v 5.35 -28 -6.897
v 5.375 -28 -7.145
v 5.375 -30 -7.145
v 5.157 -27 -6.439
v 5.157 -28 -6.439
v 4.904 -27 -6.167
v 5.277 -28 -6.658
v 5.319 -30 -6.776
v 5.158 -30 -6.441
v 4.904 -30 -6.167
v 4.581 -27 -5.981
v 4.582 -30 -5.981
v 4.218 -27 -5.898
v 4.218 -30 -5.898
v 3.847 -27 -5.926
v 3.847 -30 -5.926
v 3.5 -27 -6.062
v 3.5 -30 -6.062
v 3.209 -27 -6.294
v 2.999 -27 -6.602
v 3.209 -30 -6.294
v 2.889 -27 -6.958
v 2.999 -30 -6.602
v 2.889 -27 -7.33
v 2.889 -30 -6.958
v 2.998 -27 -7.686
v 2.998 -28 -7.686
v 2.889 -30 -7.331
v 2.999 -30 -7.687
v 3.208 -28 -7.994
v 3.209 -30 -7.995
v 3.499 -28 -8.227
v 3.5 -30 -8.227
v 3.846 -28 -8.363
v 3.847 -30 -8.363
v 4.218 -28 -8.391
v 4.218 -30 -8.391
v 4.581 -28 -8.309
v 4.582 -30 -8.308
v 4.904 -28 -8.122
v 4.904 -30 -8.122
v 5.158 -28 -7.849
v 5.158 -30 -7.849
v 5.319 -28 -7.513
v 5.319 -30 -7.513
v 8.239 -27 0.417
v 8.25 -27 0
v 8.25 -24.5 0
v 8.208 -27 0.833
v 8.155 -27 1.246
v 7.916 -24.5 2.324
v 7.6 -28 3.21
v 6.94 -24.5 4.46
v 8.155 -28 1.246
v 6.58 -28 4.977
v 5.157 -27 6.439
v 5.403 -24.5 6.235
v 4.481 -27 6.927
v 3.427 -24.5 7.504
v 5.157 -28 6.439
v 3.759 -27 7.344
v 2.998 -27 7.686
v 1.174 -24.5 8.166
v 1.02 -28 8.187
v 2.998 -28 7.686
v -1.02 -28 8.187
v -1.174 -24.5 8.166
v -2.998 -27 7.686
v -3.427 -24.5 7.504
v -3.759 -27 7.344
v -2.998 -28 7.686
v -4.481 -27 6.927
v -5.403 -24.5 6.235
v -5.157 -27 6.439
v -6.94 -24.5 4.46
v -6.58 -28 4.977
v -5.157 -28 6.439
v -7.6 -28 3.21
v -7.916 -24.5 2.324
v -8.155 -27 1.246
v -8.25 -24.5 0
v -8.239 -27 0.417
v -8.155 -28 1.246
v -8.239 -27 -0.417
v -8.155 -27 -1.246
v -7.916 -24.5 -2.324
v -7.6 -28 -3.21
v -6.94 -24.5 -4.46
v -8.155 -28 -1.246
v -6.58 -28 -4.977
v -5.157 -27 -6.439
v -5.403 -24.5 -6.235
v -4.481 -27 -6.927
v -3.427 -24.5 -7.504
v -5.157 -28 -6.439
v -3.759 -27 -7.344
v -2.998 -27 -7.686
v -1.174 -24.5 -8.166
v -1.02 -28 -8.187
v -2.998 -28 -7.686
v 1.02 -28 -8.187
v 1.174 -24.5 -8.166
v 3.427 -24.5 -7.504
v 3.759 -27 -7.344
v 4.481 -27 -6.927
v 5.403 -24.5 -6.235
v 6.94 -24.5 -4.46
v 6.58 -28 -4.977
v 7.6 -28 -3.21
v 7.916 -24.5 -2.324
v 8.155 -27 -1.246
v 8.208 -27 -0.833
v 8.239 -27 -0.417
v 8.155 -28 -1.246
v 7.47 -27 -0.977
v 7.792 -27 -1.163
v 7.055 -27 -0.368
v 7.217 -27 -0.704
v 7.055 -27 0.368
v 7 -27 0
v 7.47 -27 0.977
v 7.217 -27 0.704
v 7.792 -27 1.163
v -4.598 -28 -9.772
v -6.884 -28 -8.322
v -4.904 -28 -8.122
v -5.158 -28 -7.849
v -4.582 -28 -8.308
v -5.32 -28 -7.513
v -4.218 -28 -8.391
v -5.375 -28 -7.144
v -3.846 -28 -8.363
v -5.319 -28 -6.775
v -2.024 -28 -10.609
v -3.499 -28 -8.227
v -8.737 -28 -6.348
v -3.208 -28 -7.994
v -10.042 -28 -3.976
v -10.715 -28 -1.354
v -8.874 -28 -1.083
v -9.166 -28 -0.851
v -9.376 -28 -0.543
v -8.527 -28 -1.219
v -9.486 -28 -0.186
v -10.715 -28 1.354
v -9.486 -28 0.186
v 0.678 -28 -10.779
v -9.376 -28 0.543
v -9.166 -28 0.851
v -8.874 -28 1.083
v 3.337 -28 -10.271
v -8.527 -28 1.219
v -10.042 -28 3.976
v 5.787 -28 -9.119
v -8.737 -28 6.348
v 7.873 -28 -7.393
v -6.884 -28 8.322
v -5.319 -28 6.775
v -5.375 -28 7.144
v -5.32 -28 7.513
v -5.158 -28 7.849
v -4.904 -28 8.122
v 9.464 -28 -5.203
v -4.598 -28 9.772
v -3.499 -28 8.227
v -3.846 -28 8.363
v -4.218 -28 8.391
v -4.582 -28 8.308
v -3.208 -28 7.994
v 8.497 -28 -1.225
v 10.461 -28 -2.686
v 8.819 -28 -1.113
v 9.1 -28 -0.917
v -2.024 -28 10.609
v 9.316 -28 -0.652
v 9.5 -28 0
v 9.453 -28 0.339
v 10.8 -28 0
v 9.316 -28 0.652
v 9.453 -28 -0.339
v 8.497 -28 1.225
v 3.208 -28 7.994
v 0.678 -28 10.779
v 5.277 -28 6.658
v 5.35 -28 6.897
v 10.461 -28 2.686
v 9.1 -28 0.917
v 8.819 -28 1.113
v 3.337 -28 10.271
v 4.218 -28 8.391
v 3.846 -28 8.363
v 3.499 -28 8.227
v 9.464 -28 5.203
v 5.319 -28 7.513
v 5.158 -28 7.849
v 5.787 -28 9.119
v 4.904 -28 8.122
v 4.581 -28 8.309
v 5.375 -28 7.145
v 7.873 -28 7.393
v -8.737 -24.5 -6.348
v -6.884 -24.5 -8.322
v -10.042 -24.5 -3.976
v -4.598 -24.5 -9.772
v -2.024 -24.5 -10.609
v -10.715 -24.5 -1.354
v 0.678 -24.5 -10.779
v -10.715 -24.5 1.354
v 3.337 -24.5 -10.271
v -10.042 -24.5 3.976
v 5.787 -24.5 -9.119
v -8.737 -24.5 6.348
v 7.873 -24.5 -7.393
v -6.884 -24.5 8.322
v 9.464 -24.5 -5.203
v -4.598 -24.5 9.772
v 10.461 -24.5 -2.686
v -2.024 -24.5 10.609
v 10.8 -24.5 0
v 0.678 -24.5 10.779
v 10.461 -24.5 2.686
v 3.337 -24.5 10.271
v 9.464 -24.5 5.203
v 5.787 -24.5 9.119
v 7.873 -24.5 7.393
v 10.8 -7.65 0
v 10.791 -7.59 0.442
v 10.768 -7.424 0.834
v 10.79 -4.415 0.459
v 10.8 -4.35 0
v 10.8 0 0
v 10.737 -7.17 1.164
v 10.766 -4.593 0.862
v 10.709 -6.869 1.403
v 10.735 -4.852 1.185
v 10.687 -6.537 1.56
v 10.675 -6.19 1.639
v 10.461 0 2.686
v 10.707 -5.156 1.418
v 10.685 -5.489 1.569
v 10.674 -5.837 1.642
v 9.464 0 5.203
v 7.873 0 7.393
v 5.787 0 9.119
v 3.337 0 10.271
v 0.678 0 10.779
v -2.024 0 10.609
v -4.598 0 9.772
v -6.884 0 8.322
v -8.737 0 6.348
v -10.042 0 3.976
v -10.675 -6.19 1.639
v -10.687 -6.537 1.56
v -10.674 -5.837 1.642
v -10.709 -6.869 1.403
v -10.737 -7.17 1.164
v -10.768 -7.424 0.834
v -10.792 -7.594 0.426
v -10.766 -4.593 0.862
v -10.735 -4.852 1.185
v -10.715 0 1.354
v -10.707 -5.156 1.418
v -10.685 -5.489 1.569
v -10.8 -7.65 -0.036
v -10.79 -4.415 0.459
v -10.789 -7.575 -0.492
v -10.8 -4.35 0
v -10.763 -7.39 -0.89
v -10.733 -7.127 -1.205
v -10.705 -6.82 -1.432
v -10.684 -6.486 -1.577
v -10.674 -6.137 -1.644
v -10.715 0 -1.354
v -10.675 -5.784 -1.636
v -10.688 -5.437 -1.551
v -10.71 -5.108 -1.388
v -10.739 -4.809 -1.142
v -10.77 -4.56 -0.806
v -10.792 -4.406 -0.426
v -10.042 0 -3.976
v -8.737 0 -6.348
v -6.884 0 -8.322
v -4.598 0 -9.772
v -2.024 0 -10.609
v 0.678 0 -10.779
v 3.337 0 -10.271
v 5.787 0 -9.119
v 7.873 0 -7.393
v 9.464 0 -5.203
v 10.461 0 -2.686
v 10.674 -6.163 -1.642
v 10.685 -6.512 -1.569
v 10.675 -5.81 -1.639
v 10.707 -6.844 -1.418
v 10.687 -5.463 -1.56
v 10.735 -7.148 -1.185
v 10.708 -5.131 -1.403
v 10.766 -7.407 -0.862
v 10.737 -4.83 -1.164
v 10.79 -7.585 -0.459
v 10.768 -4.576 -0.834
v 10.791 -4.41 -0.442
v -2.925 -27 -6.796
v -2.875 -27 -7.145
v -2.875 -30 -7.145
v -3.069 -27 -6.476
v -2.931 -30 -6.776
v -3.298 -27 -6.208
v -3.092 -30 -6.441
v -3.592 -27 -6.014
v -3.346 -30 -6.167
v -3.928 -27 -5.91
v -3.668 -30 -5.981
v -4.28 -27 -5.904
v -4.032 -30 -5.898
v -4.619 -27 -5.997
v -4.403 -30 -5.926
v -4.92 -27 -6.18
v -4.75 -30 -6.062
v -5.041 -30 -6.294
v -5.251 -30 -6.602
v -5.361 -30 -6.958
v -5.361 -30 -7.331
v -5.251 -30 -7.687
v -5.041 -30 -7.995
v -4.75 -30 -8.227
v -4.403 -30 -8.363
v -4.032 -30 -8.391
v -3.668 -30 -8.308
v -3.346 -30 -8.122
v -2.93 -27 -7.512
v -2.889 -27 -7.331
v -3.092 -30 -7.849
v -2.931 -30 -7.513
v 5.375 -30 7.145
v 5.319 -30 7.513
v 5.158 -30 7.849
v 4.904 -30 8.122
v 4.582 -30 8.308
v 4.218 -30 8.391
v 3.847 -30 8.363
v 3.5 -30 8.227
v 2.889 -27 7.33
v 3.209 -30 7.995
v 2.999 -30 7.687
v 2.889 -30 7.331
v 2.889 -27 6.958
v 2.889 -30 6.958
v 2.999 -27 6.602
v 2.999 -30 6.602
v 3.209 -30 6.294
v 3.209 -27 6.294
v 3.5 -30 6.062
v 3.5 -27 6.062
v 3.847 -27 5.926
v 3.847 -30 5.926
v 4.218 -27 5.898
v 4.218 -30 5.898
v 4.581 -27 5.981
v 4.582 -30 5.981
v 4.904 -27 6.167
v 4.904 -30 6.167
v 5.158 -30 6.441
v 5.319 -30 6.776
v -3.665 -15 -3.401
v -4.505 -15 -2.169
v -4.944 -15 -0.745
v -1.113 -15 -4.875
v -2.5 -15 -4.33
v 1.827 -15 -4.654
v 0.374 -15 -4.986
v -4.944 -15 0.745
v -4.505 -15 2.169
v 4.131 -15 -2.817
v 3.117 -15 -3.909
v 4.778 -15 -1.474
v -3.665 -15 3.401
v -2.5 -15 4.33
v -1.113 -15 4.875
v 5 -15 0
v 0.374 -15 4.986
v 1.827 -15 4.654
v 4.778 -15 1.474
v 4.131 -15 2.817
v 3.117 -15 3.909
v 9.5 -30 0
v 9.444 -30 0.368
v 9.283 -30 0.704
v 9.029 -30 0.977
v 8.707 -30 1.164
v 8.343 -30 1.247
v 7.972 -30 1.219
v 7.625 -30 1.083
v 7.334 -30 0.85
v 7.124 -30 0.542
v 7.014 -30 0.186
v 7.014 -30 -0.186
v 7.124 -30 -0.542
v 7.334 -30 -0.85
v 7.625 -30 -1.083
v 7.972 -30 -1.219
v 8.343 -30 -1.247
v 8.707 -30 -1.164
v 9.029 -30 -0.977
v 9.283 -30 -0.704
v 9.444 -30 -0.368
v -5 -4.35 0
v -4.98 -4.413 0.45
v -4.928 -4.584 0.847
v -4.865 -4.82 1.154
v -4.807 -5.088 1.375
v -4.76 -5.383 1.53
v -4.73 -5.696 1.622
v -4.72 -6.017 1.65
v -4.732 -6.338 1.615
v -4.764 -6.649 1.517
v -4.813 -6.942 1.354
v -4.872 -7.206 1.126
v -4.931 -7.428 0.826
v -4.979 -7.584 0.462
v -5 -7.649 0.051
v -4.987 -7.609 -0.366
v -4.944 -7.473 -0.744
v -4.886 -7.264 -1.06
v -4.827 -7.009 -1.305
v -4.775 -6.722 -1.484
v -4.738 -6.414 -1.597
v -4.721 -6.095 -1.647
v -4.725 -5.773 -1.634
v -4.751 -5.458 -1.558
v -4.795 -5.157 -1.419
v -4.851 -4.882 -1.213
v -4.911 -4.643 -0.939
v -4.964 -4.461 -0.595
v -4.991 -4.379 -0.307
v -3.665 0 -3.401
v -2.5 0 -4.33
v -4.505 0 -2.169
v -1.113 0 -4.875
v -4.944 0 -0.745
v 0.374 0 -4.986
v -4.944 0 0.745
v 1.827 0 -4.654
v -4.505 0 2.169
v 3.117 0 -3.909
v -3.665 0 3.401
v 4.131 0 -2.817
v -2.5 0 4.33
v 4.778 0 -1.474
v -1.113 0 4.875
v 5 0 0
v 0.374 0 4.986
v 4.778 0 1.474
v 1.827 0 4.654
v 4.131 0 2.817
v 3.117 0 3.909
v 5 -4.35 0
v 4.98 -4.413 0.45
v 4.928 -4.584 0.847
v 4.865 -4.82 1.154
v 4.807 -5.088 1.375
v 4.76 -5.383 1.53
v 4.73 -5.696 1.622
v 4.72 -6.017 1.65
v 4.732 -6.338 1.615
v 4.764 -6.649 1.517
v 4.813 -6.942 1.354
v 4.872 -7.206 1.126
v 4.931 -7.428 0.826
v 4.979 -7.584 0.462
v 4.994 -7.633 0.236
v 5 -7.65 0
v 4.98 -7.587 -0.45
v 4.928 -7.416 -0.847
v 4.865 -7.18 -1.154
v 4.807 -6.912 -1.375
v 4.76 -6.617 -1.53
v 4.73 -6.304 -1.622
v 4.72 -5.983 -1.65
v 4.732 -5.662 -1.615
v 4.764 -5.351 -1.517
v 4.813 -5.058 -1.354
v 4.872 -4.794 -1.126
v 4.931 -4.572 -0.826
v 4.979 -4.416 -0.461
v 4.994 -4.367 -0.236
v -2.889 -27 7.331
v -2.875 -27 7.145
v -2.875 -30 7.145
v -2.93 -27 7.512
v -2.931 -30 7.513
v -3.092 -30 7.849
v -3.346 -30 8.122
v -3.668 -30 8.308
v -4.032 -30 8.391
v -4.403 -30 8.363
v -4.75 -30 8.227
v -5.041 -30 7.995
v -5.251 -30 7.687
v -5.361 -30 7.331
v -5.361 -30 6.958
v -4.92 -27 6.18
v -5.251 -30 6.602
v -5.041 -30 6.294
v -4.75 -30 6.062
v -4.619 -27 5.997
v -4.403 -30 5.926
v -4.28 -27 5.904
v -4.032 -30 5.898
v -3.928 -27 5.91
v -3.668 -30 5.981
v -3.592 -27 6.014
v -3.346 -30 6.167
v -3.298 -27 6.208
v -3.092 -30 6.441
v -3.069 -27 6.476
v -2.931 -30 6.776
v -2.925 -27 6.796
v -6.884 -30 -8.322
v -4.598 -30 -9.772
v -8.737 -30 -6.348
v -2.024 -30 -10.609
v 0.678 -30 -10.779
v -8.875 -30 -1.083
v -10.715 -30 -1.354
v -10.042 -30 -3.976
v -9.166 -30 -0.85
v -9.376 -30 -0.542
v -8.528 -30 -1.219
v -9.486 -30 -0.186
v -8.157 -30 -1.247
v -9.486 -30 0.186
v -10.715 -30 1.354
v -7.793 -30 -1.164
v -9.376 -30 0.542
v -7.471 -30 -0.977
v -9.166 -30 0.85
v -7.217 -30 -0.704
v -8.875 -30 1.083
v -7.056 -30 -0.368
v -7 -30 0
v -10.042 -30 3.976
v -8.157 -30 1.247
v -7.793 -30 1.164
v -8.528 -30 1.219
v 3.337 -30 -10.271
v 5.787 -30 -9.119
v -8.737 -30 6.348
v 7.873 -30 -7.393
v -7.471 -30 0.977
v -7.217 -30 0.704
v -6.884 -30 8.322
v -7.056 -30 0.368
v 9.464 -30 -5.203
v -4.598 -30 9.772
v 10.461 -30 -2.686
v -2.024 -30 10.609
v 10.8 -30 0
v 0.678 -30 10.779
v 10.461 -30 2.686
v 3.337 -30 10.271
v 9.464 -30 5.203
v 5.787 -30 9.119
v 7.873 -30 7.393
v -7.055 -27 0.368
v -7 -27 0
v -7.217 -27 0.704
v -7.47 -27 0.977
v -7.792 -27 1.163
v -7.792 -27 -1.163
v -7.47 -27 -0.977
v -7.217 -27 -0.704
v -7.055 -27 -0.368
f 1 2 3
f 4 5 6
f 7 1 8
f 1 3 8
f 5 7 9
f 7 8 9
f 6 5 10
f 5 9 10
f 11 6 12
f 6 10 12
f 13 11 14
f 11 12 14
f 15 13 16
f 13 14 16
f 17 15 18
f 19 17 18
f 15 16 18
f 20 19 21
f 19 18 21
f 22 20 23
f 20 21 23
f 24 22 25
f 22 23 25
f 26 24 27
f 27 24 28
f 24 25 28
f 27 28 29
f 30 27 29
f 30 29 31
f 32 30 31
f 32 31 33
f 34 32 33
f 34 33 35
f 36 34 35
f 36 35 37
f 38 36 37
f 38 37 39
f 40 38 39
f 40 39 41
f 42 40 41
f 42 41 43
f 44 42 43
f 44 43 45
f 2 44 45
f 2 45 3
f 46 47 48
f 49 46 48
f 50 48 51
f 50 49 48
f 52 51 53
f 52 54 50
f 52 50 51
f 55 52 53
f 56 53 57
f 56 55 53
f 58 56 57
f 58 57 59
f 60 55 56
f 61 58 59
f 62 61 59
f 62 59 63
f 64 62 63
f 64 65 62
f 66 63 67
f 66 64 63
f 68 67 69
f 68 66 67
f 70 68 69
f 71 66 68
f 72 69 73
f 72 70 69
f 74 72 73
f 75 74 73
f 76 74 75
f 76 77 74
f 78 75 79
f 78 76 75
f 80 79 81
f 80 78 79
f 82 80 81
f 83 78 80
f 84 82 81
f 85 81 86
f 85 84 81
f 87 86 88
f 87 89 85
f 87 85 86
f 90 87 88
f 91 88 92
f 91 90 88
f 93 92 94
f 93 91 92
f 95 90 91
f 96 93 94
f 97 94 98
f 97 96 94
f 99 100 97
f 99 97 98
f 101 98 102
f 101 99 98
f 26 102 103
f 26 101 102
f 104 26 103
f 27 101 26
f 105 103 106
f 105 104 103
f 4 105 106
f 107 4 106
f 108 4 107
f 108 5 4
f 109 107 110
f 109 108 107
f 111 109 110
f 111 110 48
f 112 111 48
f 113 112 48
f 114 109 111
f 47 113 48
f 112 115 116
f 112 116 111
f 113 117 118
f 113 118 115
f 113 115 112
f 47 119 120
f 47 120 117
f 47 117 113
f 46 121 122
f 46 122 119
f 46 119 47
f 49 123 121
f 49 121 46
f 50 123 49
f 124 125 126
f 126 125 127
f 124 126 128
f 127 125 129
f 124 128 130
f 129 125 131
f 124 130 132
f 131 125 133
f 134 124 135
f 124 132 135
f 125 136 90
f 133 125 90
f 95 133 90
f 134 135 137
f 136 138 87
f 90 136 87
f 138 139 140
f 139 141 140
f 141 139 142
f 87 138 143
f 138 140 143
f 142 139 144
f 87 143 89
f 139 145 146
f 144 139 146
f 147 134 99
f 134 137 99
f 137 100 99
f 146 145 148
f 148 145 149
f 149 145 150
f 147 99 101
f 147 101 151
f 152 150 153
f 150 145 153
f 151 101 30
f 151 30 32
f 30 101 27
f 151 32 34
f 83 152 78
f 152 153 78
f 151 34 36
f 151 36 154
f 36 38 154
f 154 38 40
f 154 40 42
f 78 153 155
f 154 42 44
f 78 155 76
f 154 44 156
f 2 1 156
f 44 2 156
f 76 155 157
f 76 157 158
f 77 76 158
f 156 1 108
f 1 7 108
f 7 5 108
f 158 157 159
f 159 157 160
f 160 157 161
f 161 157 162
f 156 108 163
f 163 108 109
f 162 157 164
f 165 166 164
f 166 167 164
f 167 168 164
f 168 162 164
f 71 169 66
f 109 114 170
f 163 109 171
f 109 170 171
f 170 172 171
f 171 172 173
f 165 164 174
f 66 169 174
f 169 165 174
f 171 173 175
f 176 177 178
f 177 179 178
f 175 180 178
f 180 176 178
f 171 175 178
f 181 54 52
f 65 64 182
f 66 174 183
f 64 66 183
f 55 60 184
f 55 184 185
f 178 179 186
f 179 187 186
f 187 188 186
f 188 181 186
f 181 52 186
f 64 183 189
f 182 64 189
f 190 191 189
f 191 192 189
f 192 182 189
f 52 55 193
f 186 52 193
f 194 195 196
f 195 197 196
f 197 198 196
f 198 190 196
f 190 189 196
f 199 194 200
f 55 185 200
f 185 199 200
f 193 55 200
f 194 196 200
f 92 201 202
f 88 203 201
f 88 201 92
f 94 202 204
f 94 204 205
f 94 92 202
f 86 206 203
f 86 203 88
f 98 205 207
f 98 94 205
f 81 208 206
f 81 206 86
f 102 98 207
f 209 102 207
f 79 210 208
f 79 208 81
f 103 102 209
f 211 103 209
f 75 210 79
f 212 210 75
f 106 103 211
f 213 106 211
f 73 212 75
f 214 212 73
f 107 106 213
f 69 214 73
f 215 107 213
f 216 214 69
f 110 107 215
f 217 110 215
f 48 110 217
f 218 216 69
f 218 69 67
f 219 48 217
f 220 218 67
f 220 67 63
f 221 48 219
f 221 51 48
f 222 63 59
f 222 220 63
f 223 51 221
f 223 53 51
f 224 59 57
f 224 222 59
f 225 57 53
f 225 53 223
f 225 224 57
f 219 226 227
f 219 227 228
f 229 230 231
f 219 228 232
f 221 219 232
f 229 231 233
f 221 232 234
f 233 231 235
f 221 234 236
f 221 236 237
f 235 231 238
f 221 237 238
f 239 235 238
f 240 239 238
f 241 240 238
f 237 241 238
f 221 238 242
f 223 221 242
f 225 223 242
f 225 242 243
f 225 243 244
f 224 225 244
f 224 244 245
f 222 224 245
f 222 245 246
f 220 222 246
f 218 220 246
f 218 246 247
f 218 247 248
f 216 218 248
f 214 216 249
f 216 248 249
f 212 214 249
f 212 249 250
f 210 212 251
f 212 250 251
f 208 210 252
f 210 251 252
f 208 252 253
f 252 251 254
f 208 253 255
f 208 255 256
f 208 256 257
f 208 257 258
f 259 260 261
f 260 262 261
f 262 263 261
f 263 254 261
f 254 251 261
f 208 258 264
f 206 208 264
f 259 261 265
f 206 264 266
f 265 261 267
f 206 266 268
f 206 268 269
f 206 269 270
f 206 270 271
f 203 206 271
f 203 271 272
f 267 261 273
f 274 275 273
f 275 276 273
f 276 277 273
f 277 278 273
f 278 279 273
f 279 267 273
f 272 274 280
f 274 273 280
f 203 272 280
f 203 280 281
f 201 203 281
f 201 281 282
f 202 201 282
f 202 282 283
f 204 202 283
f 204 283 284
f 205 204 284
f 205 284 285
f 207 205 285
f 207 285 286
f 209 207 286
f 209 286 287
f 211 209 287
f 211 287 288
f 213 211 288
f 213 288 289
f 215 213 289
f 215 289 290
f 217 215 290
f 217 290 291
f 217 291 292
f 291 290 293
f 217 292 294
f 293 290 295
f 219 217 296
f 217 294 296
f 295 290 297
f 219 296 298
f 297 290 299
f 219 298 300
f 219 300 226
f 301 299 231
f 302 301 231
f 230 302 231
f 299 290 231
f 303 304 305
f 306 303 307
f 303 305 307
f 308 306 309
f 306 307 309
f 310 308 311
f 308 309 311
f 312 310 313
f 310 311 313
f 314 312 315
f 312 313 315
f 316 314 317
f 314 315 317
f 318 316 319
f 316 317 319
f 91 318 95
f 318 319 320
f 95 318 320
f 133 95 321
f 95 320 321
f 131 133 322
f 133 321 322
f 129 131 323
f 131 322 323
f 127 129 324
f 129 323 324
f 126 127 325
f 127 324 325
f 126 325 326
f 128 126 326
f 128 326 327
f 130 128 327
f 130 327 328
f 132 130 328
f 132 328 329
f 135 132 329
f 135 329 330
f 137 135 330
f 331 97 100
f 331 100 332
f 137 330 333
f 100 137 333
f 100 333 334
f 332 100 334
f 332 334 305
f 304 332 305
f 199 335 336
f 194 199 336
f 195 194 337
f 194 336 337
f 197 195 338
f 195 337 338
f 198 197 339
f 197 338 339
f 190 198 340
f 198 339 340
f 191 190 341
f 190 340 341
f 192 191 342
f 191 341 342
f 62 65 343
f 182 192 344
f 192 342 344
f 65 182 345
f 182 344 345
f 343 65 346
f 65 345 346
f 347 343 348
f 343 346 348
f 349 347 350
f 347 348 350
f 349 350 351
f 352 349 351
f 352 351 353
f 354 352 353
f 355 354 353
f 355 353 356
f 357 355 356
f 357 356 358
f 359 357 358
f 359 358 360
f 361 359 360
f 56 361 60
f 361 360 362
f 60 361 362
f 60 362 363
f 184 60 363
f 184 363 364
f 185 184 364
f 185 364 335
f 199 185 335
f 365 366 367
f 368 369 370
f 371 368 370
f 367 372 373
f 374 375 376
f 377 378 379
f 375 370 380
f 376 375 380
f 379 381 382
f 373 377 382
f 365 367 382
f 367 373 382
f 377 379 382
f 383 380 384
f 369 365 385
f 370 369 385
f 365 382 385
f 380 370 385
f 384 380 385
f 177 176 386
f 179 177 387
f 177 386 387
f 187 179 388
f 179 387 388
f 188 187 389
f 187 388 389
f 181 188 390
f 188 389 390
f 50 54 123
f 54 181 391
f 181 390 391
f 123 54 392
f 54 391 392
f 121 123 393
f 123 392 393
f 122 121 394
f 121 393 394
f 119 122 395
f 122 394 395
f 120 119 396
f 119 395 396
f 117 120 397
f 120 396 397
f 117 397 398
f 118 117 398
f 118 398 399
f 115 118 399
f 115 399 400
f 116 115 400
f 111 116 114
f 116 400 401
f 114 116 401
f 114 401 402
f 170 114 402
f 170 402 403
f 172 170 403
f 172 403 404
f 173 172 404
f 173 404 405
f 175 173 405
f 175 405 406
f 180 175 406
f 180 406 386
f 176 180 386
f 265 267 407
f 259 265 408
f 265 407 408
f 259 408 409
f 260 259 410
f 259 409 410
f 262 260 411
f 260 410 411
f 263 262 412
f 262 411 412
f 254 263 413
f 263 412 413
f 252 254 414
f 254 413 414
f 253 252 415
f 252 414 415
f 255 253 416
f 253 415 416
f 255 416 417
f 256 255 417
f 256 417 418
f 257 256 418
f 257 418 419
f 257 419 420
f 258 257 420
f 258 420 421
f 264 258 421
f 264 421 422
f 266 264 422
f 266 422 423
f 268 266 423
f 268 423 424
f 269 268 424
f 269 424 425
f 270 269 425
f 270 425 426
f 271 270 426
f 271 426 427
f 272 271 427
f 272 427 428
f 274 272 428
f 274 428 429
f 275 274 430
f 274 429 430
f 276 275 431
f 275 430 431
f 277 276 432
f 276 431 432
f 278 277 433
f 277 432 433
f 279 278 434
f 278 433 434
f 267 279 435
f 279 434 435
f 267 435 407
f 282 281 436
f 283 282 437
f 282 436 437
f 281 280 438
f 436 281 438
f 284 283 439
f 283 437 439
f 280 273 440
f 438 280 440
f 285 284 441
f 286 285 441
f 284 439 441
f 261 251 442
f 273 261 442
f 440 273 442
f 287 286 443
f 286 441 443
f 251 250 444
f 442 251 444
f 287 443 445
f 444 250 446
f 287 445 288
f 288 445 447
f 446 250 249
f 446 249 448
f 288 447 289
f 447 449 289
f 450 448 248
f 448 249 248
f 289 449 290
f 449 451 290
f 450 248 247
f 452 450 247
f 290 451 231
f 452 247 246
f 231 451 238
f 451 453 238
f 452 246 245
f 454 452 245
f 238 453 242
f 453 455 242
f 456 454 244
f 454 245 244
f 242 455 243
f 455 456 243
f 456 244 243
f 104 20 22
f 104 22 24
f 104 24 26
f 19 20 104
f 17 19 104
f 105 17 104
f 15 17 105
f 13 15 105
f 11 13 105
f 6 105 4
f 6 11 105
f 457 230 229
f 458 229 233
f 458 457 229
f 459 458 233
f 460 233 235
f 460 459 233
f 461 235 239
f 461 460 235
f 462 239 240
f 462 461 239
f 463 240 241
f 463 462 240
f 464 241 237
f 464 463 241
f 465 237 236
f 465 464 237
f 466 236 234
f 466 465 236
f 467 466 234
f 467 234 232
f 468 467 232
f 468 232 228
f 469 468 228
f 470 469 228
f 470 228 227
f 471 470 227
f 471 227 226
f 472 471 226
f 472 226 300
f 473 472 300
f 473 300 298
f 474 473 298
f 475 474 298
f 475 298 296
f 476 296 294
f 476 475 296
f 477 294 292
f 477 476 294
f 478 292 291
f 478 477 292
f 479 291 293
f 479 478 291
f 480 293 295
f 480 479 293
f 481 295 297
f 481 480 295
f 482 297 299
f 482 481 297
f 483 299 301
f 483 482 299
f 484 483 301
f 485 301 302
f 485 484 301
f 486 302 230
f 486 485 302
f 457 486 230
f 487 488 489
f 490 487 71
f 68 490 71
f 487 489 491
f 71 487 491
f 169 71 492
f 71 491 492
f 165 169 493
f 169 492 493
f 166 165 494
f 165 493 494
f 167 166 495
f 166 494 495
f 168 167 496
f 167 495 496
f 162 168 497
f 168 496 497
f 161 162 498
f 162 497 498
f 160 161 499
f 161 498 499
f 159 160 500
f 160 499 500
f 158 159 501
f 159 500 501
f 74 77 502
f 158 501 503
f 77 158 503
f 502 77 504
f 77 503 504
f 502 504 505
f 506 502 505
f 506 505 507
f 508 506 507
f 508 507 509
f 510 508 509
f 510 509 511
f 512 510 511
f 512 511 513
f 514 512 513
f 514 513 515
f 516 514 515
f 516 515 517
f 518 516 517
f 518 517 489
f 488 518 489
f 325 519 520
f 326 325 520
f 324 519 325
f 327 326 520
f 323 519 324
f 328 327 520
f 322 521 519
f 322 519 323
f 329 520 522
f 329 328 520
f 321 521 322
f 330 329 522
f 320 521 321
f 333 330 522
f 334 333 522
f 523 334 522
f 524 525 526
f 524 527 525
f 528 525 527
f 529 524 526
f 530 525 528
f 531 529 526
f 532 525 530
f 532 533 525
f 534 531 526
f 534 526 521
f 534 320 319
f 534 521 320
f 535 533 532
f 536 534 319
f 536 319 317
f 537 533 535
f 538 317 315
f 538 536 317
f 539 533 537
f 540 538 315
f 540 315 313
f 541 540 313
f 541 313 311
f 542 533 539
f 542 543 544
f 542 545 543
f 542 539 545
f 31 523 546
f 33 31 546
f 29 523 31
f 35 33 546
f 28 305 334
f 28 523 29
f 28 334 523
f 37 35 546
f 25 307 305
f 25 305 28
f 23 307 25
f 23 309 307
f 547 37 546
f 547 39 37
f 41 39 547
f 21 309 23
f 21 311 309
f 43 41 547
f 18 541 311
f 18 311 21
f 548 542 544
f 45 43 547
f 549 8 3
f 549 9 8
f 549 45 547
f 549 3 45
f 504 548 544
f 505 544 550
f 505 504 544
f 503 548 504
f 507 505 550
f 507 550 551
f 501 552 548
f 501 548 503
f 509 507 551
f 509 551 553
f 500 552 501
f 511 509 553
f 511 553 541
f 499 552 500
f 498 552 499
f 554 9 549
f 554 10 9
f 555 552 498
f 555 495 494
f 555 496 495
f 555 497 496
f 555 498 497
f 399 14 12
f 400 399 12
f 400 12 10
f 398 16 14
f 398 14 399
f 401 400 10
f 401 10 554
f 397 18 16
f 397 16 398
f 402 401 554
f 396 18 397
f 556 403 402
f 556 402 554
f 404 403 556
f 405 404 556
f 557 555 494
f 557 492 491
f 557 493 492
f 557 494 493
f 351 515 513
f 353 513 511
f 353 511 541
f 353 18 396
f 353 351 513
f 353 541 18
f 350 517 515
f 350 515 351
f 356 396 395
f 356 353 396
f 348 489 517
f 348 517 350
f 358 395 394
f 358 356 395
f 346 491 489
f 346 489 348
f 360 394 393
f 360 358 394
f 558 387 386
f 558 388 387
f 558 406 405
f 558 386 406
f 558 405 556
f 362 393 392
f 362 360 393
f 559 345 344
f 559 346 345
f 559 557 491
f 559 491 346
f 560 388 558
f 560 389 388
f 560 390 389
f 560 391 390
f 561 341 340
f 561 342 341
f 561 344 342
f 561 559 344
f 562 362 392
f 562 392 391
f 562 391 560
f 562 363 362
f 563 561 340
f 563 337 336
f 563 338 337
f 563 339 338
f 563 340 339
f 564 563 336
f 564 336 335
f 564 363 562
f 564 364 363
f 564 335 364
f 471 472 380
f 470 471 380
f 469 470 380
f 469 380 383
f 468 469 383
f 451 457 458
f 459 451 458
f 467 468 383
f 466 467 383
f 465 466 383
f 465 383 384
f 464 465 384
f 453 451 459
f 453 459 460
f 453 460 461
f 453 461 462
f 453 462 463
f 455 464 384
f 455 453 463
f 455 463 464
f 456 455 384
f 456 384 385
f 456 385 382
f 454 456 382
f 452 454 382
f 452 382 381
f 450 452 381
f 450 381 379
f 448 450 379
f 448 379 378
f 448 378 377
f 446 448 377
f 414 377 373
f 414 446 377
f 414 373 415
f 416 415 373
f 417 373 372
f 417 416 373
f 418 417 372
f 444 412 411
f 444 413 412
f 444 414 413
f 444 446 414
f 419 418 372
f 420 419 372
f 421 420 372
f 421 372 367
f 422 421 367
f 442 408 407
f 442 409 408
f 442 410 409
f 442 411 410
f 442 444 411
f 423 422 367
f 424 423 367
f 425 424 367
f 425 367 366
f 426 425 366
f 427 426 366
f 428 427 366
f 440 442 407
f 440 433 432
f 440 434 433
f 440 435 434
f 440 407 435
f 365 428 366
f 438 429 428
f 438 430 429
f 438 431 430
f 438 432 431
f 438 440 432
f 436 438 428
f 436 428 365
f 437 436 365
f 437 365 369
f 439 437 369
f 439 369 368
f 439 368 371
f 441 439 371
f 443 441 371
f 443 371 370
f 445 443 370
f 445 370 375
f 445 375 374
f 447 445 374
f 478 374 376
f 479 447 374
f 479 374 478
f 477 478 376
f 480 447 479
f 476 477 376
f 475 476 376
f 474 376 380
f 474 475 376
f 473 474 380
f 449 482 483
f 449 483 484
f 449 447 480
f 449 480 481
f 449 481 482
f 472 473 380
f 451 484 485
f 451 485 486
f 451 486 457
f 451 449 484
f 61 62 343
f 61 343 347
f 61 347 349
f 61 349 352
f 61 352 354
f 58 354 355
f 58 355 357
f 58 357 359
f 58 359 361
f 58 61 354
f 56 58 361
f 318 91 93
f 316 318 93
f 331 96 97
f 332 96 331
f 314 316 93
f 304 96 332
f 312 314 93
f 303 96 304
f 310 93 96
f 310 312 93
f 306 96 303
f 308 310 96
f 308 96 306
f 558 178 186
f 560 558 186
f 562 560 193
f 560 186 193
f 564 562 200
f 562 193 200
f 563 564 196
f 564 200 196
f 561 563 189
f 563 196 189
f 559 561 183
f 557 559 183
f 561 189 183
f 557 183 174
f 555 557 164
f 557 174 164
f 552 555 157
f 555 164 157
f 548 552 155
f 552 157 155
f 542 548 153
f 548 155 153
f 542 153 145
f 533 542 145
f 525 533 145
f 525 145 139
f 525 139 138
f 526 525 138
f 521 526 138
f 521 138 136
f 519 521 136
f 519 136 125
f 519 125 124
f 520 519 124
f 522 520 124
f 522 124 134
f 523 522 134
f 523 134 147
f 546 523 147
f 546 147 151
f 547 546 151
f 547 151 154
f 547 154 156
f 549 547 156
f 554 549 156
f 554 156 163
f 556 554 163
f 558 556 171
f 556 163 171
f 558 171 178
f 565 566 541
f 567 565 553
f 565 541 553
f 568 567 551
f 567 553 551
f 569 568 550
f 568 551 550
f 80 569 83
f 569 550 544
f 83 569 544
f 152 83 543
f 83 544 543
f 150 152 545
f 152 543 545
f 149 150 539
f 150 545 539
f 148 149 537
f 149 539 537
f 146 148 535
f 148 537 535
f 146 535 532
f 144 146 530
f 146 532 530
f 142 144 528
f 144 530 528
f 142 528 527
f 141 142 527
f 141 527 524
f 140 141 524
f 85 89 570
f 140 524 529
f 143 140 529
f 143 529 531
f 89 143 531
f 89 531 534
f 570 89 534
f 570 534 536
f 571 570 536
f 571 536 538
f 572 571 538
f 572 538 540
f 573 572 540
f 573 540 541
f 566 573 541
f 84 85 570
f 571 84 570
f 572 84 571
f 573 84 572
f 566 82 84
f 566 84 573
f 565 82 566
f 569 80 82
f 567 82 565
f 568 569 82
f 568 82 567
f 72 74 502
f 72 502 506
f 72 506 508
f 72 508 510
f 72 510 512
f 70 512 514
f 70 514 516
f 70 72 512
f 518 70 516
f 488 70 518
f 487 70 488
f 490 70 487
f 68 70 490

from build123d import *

# Parameters (mm, degrees)
F0_R          = 10.8
F0_R_2        = 5
F1_DEPTH      = 30
F2_DEPTH      = 15
F3_R          = 1.65
F4_DEPTH      = 10.801
F4_DEPTH_BACK = 10.801
F6_R          = 10.8
F6_R_2        = 8.25
F7_DEPTH      = 3.5
F8_R          = 1.25
F9_DEPTH      = 3


with BuildPart() as f1:
    # F0 (on Front) → F1 (new body)
    with BuildSketch(Plane.XZ):
        Circle(F0_R)
        Circle(F0_R_2, mode=Mode.SUBTRACT)
        Circle(F0_R_2)
    extrude(amount=F1_DEPTH)

    # F0 (on Front) → F2 (cut)
    with BuildSketch(Plane.XZ):
        Circle(F0_R_2)
    extrude(amount=F2_DEPTH, mode=Mode.SUBTRACT)

    # F3 (on Right) → F4 (cut, two sides)
    with BuildSketch(Plane.YZ) as f4_sk:
        with Locations((-6, 0)):
            Circle(F3_R)
    extrude(amount=-F4_DEPTH, mode=Mode.SUBTRACT)
    extrude(f4_sk.sketch, amount=F4_DEPTH_BACK, mode=Mode.SUBTRACT)

    # F6 (on offset) → F7 (cut)
    with BuildSketch(Plane.XZ.offset(28)):
        Circle(F6_R)
        Circle(F6_R_2, mode=Mode.SUBTRACT)
    extrude(amount=-F7_DEPTH, mode=Mode.SUBTRACT)

    # F8 (on face) → F9 (cut)
    with BuildSketch(Plane.XZ.offset(30)):
        with Locations((-4.125, 7.1447095812)):
            Circle(F8_R)
        with Locations((4.125, 7.1447095812)):
            Circle(F8_R)
        with Locations((-8.25, 0)):
            Circle(F8_R)
        with Locations((-4.125, -7.1447095812)):
            Circle(F8_R)
        with Locations((4.125, -7.1447095812)):
            Circle(F8_R)
        with Locations((8.25, 0)):
            Circle(F8_R)
    extrude(amount=-F9_DEPTH, mode=Mode.SUBTRACT)


solid = f1.part
